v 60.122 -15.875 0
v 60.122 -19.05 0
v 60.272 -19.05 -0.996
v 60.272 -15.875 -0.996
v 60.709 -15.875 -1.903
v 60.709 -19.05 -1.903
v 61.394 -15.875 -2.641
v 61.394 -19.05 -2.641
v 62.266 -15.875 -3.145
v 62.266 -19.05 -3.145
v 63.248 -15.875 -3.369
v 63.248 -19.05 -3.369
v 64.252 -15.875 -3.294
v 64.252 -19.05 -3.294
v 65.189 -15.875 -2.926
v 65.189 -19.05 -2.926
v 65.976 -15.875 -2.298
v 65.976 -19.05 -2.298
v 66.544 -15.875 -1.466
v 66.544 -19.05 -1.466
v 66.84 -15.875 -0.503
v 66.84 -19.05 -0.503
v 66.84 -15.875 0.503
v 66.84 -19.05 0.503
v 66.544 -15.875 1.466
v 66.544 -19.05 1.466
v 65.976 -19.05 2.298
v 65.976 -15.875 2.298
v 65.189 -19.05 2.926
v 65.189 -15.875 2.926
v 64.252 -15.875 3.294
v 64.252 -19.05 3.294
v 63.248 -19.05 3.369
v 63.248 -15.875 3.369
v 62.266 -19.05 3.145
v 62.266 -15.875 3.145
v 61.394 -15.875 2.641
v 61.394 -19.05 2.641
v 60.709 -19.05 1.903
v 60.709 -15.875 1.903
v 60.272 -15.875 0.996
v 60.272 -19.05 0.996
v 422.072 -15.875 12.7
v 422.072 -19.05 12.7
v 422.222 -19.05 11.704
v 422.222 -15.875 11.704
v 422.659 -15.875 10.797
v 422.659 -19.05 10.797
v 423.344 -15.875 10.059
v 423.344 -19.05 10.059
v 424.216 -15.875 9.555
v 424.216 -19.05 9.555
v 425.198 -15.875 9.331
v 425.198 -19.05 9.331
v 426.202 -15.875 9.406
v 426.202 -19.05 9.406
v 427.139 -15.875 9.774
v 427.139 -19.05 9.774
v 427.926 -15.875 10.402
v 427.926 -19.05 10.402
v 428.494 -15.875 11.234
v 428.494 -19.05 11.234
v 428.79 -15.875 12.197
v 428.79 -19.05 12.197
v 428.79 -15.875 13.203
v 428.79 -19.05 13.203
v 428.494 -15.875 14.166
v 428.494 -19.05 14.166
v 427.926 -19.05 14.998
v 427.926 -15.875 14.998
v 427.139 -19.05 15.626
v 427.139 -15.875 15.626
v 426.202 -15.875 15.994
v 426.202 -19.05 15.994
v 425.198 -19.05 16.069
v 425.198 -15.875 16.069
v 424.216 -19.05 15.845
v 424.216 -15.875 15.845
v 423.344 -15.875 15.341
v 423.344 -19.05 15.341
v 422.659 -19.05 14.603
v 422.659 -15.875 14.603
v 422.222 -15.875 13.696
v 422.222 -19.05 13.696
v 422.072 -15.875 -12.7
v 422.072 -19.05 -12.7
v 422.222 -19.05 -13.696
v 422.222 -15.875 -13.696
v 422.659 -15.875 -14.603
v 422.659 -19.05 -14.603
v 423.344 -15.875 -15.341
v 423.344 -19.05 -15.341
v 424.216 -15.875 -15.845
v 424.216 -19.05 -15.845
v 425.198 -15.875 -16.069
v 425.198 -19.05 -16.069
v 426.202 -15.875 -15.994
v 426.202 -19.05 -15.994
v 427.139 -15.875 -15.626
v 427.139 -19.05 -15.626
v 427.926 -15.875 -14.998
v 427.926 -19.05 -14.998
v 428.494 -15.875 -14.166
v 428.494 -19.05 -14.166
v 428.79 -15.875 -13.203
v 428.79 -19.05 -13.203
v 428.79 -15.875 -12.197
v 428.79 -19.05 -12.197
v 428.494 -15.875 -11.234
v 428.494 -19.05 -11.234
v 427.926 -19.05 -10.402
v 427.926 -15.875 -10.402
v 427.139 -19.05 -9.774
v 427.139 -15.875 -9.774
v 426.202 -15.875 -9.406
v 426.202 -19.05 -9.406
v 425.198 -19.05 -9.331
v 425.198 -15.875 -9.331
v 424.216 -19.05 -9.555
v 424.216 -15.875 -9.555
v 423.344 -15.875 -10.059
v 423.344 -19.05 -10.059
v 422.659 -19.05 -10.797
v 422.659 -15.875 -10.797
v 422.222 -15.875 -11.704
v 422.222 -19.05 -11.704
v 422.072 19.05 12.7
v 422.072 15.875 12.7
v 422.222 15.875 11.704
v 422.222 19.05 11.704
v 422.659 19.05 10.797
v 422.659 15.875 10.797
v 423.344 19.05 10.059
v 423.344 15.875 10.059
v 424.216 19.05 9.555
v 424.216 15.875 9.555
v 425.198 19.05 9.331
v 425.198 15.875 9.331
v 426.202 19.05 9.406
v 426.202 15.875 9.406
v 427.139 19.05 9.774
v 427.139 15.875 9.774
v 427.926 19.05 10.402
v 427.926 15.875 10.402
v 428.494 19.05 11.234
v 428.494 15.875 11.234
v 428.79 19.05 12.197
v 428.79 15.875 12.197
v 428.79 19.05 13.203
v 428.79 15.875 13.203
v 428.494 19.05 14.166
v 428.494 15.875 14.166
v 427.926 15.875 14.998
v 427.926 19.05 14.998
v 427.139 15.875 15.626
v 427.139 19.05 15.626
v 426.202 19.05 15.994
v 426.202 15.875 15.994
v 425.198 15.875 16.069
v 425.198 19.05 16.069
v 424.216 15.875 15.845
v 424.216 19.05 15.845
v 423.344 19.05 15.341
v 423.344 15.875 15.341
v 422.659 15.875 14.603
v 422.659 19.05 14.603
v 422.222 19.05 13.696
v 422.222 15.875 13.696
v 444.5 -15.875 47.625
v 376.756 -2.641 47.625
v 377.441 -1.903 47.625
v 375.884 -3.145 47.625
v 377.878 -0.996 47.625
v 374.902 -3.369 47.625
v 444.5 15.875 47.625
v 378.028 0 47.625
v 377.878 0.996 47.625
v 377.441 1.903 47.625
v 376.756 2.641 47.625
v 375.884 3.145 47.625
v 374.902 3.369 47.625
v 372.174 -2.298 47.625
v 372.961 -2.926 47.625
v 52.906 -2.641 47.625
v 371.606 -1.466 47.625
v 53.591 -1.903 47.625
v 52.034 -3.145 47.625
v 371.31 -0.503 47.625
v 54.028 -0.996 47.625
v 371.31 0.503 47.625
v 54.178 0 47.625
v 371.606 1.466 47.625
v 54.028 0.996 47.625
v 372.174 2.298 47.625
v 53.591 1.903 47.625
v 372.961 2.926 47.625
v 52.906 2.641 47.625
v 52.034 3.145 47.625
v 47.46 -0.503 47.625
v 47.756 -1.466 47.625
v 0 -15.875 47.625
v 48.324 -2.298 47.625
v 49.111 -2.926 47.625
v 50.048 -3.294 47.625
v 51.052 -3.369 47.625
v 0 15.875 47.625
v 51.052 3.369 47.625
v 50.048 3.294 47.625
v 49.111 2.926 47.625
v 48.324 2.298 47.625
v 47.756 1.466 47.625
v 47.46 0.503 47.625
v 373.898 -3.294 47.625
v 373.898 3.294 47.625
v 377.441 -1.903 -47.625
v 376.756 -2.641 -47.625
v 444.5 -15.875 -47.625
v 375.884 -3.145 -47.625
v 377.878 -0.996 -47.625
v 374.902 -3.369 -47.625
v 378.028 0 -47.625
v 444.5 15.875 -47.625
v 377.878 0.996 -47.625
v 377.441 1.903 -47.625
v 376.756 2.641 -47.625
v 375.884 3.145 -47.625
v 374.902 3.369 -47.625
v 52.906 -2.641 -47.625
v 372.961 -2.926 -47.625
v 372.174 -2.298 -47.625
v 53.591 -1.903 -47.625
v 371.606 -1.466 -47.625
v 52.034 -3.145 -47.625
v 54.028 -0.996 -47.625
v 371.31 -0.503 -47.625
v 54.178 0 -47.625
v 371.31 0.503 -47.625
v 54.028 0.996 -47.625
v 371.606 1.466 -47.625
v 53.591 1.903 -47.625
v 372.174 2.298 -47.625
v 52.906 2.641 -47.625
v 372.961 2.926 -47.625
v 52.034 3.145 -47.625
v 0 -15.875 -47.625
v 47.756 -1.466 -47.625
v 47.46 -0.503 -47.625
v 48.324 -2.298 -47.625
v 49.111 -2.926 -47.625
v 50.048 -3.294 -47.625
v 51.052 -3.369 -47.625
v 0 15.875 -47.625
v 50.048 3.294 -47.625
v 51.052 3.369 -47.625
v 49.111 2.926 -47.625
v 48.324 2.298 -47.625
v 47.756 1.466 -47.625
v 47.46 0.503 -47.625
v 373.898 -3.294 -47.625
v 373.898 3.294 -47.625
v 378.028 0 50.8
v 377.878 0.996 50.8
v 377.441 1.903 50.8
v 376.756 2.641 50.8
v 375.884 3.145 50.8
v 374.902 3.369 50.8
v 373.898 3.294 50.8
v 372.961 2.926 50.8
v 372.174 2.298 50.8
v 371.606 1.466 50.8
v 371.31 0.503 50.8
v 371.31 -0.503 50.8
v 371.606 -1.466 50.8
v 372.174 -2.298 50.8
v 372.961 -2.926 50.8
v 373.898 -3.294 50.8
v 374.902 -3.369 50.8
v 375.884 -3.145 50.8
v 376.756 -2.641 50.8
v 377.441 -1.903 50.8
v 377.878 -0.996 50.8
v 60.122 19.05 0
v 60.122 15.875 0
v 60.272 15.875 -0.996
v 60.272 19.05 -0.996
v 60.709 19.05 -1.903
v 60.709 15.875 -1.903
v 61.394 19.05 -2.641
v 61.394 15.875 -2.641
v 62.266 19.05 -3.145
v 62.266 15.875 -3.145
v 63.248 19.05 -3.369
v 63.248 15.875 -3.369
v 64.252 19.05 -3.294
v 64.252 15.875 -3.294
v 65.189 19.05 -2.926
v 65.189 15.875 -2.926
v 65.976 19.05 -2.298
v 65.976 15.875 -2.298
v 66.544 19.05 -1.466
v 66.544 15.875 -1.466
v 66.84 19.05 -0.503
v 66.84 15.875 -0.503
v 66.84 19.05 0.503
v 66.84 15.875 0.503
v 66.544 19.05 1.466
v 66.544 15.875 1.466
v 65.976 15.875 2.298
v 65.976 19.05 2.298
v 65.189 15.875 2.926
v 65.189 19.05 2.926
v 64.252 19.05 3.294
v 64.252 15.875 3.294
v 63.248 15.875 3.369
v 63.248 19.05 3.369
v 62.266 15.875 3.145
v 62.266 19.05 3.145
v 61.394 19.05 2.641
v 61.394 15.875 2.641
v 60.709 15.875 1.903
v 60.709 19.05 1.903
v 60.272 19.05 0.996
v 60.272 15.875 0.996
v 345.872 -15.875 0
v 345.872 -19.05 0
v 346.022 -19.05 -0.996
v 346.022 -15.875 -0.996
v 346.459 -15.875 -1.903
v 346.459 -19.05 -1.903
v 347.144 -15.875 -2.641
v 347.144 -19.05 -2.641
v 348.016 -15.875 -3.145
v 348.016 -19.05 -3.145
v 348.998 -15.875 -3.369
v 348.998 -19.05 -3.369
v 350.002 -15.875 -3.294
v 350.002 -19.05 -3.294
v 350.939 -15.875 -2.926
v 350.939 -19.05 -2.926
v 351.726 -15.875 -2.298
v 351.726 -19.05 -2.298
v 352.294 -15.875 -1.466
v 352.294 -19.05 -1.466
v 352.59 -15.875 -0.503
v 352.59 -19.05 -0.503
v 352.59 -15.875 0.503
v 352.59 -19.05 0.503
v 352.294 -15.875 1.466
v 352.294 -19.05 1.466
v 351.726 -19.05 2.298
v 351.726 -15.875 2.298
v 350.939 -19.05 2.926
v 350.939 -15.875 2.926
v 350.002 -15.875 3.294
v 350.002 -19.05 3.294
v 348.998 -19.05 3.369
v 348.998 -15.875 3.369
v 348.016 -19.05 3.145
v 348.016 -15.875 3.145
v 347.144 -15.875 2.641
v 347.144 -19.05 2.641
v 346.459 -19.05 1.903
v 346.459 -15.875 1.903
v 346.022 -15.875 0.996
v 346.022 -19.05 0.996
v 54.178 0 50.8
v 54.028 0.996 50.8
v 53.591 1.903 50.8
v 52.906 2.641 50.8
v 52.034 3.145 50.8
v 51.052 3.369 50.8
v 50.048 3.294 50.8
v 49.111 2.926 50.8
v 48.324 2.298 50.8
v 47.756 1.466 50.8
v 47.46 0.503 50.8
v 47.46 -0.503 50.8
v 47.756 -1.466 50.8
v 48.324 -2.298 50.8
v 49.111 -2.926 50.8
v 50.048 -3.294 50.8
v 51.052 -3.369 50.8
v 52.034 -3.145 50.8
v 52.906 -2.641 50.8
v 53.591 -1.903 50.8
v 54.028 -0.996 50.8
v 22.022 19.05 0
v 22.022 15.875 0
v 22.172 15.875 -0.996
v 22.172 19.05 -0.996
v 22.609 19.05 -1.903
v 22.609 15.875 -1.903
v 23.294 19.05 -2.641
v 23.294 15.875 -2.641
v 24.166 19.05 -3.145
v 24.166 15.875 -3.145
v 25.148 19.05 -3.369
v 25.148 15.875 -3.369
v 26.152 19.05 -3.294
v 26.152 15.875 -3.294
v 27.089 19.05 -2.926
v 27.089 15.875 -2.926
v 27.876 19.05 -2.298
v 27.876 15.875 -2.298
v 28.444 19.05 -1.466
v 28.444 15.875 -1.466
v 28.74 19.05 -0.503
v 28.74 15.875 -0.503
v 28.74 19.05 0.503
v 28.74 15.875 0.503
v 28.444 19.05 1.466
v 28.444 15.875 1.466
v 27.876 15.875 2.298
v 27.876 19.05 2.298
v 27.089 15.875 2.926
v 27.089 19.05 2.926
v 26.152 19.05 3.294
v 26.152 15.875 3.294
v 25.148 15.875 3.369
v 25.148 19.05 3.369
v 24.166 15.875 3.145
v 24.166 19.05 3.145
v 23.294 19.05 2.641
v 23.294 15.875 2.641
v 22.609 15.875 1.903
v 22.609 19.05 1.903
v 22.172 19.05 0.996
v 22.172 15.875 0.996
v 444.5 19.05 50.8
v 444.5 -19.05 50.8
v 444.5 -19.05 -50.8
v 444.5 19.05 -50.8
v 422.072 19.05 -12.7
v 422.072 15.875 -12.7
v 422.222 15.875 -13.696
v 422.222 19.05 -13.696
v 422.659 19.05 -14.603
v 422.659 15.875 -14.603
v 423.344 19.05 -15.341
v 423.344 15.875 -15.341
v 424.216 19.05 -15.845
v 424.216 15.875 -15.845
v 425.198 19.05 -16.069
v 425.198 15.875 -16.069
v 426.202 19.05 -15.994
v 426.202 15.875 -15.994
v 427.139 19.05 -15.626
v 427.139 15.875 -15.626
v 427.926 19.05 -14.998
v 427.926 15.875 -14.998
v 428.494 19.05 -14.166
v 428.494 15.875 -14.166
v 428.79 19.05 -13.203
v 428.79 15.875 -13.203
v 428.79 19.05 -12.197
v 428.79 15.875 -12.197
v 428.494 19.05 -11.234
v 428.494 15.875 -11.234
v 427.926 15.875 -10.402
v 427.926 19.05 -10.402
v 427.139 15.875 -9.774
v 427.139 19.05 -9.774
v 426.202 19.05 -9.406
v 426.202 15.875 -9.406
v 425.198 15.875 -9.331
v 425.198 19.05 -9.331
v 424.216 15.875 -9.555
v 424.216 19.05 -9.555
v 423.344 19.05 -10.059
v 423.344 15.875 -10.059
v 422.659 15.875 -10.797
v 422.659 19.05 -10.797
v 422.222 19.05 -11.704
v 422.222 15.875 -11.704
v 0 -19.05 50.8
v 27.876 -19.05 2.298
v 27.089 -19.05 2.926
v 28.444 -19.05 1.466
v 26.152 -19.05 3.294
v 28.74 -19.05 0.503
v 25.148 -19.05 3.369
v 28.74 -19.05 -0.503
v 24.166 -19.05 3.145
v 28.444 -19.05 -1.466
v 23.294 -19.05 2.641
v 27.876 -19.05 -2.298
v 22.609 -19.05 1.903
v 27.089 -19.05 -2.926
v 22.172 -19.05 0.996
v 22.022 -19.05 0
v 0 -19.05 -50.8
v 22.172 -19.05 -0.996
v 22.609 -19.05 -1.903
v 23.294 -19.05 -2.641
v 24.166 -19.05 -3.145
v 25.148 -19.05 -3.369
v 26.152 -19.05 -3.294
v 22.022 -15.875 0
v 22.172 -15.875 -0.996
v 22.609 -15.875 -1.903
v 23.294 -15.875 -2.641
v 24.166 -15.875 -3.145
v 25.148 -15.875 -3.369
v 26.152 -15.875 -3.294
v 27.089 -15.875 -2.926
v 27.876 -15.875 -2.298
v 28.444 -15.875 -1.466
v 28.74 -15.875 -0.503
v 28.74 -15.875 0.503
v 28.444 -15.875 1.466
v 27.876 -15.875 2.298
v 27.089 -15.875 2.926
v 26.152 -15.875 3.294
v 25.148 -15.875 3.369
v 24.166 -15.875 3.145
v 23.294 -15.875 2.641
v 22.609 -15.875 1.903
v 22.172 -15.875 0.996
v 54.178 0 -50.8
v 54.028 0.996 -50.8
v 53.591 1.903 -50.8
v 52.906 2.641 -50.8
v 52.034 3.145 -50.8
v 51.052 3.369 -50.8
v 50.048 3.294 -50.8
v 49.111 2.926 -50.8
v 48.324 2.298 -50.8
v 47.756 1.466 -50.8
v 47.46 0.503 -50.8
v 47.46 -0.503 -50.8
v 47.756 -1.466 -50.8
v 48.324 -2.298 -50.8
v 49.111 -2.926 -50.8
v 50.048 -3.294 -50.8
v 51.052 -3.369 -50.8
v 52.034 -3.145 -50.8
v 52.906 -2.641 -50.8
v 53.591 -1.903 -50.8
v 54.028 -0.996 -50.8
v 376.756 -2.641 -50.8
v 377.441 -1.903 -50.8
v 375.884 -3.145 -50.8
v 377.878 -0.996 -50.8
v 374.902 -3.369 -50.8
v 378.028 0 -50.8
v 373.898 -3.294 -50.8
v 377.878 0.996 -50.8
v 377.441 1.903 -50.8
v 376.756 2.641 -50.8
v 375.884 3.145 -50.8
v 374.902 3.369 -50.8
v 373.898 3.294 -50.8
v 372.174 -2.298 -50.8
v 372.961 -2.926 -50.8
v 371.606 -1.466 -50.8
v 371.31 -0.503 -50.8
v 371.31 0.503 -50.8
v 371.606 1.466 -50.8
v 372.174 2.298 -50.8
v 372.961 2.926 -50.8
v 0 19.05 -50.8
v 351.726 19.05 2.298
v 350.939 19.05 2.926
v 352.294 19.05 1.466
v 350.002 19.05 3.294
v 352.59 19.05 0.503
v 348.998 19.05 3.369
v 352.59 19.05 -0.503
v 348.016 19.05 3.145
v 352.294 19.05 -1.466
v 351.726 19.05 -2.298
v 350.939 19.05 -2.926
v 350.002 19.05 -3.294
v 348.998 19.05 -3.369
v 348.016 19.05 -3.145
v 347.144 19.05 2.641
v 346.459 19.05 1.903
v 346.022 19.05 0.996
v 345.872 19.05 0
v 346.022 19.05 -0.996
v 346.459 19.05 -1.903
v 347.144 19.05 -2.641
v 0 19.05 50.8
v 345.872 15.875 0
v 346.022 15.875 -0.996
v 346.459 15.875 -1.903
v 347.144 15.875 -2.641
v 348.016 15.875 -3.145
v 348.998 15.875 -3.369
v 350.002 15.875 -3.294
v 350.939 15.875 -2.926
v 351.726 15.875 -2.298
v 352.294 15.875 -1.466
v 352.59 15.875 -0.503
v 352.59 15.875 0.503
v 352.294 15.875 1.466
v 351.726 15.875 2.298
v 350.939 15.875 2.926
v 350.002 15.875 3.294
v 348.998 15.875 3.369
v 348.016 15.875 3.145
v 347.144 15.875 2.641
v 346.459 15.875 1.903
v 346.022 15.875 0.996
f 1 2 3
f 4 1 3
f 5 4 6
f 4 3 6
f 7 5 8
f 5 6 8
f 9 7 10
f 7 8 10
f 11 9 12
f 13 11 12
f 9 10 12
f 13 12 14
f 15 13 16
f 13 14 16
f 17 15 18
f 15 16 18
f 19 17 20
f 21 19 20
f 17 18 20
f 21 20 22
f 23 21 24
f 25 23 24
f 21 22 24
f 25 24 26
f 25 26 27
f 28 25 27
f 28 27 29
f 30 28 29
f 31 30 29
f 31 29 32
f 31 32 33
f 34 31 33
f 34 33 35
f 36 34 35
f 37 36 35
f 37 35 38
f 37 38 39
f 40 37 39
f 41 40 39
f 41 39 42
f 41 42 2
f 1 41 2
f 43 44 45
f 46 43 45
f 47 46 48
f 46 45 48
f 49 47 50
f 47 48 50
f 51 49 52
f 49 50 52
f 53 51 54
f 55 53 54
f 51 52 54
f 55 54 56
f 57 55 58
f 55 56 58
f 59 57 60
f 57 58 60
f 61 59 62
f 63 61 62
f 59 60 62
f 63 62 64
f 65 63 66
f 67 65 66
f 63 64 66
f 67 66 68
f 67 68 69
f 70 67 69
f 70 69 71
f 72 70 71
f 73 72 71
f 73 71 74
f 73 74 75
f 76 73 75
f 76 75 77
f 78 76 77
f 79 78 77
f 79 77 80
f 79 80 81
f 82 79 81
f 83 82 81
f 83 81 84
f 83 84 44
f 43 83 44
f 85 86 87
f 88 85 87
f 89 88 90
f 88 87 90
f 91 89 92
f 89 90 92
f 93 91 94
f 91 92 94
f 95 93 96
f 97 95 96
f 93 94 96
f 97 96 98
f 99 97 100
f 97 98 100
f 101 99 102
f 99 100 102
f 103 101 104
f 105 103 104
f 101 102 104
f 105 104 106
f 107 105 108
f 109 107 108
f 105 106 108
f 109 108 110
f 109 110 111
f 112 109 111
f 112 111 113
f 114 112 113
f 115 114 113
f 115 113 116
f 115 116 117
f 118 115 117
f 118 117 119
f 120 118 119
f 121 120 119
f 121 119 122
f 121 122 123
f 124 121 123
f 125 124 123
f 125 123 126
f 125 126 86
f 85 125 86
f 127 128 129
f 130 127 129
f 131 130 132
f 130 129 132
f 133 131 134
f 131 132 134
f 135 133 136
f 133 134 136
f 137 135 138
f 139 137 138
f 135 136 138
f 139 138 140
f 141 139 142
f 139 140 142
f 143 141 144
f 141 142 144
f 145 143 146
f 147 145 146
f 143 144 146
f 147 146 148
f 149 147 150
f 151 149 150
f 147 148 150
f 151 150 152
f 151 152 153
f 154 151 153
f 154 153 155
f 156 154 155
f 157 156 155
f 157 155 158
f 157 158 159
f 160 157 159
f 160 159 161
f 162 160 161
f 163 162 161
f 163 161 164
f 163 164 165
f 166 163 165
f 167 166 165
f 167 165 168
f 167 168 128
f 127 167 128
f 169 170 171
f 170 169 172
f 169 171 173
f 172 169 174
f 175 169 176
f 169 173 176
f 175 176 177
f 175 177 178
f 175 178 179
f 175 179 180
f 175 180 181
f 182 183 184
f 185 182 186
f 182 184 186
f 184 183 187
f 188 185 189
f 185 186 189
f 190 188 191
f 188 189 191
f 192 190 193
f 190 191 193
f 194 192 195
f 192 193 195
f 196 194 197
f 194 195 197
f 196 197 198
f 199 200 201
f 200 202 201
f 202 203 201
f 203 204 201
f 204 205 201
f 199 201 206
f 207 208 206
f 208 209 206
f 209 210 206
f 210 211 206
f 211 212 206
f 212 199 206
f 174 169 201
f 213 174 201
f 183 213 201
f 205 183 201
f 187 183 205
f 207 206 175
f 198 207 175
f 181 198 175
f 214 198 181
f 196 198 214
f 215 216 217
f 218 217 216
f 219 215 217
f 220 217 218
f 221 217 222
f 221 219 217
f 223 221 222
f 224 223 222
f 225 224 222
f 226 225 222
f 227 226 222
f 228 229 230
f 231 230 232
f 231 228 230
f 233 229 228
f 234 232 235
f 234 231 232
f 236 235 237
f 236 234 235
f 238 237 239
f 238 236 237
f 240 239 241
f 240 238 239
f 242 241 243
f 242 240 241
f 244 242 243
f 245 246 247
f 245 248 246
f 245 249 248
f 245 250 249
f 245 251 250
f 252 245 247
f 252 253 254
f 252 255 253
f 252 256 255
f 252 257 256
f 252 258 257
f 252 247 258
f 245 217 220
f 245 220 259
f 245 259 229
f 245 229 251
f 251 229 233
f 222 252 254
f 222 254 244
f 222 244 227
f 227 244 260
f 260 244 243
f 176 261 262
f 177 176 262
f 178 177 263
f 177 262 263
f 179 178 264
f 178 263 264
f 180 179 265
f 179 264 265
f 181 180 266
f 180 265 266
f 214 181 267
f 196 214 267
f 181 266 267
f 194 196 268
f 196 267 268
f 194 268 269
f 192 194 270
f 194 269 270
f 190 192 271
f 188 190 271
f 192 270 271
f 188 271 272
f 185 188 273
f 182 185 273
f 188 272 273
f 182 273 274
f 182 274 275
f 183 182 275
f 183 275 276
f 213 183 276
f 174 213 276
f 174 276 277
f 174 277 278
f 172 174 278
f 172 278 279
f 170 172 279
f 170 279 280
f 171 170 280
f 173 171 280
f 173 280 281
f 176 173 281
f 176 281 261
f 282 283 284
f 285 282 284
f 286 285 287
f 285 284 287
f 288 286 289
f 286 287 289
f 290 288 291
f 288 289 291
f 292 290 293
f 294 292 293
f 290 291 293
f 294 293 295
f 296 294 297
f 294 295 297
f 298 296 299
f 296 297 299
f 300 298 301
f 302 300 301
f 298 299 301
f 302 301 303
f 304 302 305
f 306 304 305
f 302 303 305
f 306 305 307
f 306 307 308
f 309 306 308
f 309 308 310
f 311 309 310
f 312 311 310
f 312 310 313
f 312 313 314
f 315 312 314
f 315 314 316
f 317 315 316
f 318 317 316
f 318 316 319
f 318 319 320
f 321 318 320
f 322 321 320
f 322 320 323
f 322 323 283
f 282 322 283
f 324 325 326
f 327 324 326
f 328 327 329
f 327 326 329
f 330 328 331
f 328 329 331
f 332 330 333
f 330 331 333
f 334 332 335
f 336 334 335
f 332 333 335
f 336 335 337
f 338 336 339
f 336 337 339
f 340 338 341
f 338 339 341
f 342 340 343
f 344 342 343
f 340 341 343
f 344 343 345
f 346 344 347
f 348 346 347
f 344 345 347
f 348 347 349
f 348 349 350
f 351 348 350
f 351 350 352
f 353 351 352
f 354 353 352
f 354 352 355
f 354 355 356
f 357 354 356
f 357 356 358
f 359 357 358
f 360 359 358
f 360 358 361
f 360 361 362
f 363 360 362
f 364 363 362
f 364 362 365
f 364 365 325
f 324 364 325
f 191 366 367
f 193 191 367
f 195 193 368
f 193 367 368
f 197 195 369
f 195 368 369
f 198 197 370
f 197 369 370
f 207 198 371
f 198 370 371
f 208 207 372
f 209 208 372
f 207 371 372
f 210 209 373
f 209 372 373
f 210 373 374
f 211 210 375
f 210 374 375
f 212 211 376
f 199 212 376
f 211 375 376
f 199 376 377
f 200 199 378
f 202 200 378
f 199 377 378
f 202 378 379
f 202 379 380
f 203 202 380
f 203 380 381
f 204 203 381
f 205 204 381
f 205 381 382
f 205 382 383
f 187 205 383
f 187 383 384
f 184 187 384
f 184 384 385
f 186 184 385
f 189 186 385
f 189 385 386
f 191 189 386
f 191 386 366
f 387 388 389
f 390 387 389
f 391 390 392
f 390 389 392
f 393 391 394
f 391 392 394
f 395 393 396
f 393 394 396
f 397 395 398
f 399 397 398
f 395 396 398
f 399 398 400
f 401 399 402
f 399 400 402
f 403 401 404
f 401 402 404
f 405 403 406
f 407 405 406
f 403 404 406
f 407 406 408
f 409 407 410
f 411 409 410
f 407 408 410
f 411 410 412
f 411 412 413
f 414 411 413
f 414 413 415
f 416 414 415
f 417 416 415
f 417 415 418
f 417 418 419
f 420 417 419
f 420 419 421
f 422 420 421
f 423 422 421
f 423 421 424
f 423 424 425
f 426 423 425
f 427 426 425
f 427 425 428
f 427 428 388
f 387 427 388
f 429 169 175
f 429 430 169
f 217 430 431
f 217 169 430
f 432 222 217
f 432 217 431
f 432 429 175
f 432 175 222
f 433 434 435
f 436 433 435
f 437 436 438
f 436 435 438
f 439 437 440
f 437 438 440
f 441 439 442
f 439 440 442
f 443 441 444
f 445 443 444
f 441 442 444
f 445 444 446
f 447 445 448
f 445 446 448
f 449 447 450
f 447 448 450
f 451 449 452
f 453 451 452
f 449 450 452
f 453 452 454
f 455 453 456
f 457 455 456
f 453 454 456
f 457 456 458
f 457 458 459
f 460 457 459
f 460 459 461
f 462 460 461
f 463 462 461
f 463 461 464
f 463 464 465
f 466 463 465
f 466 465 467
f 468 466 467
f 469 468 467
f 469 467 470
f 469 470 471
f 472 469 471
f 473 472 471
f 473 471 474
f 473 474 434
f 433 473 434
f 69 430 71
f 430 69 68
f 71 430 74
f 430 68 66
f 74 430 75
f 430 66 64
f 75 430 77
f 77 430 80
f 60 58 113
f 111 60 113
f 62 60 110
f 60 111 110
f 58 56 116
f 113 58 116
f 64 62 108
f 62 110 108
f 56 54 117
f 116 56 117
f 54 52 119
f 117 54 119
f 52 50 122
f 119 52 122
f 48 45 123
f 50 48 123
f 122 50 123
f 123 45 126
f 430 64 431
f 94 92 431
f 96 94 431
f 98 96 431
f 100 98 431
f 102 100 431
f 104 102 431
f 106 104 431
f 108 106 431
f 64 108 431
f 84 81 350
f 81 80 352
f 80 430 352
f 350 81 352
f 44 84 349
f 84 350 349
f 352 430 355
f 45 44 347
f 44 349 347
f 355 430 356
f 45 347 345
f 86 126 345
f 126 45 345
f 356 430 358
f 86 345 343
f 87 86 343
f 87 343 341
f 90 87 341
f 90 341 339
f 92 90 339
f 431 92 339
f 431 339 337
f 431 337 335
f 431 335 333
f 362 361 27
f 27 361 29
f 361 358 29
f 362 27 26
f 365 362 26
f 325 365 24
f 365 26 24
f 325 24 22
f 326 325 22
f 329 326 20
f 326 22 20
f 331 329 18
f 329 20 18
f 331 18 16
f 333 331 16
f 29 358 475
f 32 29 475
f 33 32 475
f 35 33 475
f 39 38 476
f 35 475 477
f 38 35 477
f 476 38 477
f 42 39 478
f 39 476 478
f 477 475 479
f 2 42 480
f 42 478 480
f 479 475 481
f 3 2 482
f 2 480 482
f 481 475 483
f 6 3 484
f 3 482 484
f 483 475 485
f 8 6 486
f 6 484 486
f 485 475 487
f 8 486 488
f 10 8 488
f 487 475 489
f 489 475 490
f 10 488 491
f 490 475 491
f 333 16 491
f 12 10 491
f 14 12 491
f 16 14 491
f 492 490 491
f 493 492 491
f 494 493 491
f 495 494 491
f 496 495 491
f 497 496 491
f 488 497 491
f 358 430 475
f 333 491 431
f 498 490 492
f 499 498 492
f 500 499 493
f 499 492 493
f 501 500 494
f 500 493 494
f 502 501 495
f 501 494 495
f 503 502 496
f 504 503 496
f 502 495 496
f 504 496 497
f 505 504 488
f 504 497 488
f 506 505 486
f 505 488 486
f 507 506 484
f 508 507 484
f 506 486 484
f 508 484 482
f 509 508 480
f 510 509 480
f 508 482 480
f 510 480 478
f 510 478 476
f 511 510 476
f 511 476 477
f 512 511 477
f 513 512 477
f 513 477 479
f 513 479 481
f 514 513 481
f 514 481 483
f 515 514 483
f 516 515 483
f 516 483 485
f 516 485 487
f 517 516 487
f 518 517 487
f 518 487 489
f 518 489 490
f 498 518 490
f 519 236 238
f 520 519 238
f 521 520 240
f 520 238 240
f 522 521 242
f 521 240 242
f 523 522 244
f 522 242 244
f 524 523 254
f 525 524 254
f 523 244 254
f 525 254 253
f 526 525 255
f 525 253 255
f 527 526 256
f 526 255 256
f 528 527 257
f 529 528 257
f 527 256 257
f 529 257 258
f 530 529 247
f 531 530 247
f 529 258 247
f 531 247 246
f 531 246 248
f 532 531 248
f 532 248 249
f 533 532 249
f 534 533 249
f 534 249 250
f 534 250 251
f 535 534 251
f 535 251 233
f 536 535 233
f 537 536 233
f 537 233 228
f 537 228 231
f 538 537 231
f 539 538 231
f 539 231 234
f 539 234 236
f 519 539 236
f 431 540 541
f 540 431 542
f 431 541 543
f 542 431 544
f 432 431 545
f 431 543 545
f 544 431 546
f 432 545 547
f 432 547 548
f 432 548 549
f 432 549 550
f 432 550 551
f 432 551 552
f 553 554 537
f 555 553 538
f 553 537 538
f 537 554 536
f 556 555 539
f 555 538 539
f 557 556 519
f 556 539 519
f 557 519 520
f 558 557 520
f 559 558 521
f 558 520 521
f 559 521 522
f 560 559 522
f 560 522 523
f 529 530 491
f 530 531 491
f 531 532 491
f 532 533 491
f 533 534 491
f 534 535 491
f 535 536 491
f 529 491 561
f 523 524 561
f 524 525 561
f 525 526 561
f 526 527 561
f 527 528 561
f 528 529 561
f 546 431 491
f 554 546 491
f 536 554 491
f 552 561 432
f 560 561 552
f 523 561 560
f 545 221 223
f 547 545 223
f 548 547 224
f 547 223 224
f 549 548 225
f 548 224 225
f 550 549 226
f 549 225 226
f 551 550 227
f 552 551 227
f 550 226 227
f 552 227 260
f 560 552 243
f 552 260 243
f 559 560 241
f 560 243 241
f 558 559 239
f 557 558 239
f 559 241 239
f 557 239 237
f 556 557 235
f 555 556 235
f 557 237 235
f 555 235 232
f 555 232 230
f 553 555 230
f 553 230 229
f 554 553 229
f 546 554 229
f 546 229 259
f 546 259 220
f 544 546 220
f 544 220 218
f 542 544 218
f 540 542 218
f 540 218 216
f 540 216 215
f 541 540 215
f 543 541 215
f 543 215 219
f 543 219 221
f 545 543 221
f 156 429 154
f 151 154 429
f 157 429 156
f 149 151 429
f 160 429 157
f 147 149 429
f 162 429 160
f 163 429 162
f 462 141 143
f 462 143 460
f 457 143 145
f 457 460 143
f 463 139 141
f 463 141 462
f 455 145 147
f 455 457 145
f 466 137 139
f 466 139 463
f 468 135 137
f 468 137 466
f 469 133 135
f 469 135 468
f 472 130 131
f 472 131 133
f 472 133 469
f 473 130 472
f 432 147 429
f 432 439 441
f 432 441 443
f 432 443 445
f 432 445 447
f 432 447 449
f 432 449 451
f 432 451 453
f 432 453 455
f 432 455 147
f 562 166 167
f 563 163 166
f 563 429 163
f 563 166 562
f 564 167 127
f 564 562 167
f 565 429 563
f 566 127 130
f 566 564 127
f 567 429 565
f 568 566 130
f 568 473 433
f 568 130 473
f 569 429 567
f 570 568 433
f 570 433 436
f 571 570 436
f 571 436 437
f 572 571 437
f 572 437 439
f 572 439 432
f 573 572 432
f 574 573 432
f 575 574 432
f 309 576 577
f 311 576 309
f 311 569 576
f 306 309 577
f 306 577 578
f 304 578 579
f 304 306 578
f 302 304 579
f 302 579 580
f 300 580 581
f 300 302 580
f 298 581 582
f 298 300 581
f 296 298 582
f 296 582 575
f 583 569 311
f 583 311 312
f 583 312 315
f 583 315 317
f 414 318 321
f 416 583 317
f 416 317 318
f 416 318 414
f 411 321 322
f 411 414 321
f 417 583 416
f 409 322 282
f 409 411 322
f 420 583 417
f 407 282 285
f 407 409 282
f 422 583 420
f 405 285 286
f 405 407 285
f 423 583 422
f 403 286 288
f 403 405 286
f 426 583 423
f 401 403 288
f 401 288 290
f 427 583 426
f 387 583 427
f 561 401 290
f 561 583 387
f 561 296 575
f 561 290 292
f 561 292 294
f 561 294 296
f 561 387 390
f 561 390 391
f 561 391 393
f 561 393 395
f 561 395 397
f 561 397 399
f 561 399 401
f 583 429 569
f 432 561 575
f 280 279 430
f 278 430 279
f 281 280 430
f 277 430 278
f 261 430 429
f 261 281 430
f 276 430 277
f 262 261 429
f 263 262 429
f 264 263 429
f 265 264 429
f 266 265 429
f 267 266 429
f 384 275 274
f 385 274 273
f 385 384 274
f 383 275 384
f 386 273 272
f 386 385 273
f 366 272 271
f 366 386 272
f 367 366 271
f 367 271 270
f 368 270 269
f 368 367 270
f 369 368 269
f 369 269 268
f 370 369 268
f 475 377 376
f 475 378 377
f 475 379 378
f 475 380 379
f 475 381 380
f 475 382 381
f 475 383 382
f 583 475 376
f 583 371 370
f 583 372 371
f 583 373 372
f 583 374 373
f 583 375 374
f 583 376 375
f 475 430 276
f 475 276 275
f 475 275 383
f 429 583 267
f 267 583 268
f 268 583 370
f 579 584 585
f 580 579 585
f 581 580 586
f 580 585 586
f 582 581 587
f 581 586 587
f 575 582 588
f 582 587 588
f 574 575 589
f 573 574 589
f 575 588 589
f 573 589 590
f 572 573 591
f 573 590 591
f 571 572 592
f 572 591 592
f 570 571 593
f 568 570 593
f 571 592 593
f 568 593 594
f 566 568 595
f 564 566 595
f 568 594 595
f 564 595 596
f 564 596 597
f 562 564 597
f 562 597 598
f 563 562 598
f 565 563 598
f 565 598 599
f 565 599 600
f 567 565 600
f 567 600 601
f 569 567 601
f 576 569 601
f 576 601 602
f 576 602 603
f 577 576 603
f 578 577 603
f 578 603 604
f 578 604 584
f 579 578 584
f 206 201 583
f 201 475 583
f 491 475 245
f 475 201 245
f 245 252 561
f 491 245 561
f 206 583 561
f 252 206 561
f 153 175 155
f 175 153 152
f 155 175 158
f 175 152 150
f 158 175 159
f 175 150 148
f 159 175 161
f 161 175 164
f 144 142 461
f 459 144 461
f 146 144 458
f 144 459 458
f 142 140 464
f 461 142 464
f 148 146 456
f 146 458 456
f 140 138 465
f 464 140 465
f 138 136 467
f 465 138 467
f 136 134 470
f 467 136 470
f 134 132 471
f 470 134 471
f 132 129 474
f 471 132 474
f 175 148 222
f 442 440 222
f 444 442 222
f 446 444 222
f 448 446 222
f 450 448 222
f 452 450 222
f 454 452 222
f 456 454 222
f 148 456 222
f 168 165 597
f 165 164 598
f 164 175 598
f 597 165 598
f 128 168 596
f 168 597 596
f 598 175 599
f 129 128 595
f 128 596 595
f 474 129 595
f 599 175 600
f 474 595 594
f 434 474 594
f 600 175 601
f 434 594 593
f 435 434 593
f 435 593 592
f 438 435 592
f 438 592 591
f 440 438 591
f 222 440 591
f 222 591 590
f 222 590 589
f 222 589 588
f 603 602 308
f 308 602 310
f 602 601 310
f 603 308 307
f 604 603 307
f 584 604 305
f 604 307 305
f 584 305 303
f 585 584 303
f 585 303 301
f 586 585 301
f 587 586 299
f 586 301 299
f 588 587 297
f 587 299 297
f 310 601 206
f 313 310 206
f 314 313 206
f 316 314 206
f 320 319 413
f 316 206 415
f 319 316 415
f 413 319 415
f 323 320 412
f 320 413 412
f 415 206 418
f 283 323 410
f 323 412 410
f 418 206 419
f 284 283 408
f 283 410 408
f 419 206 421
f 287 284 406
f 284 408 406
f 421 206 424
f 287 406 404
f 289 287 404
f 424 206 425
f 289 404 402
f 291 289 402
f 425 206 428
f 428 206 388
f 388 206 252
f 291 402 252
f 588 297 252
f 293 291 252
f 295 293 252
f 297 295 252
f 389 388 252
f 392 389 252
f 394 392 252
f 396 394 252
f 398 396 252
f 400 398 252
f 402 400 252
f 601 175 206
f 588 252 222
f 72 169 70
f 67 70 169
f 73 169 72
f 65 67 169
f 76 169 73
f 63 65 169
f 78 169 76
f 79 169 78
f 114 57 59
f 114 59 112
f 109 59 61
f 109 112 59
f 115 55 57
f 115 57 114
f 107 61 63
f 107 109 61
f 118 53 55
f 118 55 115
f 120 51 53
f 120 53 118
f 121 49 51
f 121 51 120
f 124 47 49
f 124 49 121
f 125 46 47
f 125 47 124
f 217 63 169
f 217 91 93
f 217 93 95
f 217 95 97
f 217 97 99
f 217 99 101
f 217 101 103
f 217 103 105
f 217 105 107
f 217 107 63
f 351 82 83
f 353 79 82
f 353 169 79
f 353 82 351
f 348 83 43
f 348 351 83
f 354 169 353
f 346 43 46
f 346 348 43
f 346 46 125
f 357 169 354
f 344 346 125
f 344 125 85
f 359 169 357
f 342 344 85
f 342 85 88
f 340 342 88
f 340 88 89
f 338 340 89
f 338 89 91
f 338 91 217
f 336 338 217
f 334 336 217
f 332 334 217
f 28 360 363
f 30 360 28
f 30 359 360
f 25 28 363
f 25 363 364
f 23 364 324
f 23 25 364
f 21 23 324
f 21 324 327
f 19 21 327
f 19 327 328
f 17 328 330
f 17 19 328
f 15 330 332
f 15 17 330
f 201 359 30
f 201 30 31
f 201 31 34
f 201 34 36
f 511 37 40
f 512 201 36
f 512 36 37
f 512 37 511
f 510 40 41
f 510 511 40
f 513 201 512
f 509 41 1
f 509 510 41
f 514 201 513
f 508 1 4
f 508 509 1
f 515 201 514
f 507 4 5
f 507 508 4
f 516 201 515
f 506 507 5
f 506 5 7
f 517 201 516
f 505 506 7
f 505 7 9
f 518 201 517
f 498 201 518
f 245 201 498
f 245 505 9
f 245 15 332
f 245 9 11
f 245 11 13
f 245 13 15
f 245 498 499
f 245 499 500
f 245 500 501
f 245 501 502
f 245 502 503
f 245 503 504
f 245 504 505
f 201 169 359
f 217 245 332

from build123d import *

# Parameters (mm, degrees)
SKETCH1_W                = 101.6
SKETCH1_H                = 38.1
SKETCH1_W_2              = 95.25
SKETCH1_H_2              = 31.75
BOSS_EXTRUDE1_DEPTH      = 444.5
H_0_266_DIAMETER_HOLE1_D = 6.7564
H_0_266_DIAMETER_HOLE2_D = 6.7564


with BuildPart() as part:
    # Sketch1 → Boss-Extrude1 (new body)
    with BuildSketch(Plane(origin=(0, 0, 0), x_dir=(0, 0, -1), z_dir=(1, 0, 0))):
        Rectangle(SKETCH1_W, SKETCH1_H)
        Rectangle(SKETCH1_W_2, SKETCH1_H_2, mode=Mode.SUBTRACT)
    extrude(amount=BOSS_EXTRUDE1_DEPTH)

    # H (0.266) Diameter Hole1 (through all)
    with Locations(Plane(origin=(0, 19.05, 0), x_dir=(1, 0, 0), z_dir=(0, 1, 0))):
        with Locations((25.4, 0), (63.5, 0), (349.25, 0), (425.45, 12.7), (425.45, -12.7)):
            Hole(H_0_266_DIAMETER_HOLE1_D / 2)

    # H (0.266) Diameter Hole2 (through all)
    with Locations(Plane(origin=(0, 0, -50.8), x_dir=(-1, 0, 0), z_dir=(0, 0, -1))):
        with Locations((-50.8, 0), (-374.65, 0)):
            Hole(H_0_266_DIAMETER_HOLE2_D / 2)


solid = part.part
